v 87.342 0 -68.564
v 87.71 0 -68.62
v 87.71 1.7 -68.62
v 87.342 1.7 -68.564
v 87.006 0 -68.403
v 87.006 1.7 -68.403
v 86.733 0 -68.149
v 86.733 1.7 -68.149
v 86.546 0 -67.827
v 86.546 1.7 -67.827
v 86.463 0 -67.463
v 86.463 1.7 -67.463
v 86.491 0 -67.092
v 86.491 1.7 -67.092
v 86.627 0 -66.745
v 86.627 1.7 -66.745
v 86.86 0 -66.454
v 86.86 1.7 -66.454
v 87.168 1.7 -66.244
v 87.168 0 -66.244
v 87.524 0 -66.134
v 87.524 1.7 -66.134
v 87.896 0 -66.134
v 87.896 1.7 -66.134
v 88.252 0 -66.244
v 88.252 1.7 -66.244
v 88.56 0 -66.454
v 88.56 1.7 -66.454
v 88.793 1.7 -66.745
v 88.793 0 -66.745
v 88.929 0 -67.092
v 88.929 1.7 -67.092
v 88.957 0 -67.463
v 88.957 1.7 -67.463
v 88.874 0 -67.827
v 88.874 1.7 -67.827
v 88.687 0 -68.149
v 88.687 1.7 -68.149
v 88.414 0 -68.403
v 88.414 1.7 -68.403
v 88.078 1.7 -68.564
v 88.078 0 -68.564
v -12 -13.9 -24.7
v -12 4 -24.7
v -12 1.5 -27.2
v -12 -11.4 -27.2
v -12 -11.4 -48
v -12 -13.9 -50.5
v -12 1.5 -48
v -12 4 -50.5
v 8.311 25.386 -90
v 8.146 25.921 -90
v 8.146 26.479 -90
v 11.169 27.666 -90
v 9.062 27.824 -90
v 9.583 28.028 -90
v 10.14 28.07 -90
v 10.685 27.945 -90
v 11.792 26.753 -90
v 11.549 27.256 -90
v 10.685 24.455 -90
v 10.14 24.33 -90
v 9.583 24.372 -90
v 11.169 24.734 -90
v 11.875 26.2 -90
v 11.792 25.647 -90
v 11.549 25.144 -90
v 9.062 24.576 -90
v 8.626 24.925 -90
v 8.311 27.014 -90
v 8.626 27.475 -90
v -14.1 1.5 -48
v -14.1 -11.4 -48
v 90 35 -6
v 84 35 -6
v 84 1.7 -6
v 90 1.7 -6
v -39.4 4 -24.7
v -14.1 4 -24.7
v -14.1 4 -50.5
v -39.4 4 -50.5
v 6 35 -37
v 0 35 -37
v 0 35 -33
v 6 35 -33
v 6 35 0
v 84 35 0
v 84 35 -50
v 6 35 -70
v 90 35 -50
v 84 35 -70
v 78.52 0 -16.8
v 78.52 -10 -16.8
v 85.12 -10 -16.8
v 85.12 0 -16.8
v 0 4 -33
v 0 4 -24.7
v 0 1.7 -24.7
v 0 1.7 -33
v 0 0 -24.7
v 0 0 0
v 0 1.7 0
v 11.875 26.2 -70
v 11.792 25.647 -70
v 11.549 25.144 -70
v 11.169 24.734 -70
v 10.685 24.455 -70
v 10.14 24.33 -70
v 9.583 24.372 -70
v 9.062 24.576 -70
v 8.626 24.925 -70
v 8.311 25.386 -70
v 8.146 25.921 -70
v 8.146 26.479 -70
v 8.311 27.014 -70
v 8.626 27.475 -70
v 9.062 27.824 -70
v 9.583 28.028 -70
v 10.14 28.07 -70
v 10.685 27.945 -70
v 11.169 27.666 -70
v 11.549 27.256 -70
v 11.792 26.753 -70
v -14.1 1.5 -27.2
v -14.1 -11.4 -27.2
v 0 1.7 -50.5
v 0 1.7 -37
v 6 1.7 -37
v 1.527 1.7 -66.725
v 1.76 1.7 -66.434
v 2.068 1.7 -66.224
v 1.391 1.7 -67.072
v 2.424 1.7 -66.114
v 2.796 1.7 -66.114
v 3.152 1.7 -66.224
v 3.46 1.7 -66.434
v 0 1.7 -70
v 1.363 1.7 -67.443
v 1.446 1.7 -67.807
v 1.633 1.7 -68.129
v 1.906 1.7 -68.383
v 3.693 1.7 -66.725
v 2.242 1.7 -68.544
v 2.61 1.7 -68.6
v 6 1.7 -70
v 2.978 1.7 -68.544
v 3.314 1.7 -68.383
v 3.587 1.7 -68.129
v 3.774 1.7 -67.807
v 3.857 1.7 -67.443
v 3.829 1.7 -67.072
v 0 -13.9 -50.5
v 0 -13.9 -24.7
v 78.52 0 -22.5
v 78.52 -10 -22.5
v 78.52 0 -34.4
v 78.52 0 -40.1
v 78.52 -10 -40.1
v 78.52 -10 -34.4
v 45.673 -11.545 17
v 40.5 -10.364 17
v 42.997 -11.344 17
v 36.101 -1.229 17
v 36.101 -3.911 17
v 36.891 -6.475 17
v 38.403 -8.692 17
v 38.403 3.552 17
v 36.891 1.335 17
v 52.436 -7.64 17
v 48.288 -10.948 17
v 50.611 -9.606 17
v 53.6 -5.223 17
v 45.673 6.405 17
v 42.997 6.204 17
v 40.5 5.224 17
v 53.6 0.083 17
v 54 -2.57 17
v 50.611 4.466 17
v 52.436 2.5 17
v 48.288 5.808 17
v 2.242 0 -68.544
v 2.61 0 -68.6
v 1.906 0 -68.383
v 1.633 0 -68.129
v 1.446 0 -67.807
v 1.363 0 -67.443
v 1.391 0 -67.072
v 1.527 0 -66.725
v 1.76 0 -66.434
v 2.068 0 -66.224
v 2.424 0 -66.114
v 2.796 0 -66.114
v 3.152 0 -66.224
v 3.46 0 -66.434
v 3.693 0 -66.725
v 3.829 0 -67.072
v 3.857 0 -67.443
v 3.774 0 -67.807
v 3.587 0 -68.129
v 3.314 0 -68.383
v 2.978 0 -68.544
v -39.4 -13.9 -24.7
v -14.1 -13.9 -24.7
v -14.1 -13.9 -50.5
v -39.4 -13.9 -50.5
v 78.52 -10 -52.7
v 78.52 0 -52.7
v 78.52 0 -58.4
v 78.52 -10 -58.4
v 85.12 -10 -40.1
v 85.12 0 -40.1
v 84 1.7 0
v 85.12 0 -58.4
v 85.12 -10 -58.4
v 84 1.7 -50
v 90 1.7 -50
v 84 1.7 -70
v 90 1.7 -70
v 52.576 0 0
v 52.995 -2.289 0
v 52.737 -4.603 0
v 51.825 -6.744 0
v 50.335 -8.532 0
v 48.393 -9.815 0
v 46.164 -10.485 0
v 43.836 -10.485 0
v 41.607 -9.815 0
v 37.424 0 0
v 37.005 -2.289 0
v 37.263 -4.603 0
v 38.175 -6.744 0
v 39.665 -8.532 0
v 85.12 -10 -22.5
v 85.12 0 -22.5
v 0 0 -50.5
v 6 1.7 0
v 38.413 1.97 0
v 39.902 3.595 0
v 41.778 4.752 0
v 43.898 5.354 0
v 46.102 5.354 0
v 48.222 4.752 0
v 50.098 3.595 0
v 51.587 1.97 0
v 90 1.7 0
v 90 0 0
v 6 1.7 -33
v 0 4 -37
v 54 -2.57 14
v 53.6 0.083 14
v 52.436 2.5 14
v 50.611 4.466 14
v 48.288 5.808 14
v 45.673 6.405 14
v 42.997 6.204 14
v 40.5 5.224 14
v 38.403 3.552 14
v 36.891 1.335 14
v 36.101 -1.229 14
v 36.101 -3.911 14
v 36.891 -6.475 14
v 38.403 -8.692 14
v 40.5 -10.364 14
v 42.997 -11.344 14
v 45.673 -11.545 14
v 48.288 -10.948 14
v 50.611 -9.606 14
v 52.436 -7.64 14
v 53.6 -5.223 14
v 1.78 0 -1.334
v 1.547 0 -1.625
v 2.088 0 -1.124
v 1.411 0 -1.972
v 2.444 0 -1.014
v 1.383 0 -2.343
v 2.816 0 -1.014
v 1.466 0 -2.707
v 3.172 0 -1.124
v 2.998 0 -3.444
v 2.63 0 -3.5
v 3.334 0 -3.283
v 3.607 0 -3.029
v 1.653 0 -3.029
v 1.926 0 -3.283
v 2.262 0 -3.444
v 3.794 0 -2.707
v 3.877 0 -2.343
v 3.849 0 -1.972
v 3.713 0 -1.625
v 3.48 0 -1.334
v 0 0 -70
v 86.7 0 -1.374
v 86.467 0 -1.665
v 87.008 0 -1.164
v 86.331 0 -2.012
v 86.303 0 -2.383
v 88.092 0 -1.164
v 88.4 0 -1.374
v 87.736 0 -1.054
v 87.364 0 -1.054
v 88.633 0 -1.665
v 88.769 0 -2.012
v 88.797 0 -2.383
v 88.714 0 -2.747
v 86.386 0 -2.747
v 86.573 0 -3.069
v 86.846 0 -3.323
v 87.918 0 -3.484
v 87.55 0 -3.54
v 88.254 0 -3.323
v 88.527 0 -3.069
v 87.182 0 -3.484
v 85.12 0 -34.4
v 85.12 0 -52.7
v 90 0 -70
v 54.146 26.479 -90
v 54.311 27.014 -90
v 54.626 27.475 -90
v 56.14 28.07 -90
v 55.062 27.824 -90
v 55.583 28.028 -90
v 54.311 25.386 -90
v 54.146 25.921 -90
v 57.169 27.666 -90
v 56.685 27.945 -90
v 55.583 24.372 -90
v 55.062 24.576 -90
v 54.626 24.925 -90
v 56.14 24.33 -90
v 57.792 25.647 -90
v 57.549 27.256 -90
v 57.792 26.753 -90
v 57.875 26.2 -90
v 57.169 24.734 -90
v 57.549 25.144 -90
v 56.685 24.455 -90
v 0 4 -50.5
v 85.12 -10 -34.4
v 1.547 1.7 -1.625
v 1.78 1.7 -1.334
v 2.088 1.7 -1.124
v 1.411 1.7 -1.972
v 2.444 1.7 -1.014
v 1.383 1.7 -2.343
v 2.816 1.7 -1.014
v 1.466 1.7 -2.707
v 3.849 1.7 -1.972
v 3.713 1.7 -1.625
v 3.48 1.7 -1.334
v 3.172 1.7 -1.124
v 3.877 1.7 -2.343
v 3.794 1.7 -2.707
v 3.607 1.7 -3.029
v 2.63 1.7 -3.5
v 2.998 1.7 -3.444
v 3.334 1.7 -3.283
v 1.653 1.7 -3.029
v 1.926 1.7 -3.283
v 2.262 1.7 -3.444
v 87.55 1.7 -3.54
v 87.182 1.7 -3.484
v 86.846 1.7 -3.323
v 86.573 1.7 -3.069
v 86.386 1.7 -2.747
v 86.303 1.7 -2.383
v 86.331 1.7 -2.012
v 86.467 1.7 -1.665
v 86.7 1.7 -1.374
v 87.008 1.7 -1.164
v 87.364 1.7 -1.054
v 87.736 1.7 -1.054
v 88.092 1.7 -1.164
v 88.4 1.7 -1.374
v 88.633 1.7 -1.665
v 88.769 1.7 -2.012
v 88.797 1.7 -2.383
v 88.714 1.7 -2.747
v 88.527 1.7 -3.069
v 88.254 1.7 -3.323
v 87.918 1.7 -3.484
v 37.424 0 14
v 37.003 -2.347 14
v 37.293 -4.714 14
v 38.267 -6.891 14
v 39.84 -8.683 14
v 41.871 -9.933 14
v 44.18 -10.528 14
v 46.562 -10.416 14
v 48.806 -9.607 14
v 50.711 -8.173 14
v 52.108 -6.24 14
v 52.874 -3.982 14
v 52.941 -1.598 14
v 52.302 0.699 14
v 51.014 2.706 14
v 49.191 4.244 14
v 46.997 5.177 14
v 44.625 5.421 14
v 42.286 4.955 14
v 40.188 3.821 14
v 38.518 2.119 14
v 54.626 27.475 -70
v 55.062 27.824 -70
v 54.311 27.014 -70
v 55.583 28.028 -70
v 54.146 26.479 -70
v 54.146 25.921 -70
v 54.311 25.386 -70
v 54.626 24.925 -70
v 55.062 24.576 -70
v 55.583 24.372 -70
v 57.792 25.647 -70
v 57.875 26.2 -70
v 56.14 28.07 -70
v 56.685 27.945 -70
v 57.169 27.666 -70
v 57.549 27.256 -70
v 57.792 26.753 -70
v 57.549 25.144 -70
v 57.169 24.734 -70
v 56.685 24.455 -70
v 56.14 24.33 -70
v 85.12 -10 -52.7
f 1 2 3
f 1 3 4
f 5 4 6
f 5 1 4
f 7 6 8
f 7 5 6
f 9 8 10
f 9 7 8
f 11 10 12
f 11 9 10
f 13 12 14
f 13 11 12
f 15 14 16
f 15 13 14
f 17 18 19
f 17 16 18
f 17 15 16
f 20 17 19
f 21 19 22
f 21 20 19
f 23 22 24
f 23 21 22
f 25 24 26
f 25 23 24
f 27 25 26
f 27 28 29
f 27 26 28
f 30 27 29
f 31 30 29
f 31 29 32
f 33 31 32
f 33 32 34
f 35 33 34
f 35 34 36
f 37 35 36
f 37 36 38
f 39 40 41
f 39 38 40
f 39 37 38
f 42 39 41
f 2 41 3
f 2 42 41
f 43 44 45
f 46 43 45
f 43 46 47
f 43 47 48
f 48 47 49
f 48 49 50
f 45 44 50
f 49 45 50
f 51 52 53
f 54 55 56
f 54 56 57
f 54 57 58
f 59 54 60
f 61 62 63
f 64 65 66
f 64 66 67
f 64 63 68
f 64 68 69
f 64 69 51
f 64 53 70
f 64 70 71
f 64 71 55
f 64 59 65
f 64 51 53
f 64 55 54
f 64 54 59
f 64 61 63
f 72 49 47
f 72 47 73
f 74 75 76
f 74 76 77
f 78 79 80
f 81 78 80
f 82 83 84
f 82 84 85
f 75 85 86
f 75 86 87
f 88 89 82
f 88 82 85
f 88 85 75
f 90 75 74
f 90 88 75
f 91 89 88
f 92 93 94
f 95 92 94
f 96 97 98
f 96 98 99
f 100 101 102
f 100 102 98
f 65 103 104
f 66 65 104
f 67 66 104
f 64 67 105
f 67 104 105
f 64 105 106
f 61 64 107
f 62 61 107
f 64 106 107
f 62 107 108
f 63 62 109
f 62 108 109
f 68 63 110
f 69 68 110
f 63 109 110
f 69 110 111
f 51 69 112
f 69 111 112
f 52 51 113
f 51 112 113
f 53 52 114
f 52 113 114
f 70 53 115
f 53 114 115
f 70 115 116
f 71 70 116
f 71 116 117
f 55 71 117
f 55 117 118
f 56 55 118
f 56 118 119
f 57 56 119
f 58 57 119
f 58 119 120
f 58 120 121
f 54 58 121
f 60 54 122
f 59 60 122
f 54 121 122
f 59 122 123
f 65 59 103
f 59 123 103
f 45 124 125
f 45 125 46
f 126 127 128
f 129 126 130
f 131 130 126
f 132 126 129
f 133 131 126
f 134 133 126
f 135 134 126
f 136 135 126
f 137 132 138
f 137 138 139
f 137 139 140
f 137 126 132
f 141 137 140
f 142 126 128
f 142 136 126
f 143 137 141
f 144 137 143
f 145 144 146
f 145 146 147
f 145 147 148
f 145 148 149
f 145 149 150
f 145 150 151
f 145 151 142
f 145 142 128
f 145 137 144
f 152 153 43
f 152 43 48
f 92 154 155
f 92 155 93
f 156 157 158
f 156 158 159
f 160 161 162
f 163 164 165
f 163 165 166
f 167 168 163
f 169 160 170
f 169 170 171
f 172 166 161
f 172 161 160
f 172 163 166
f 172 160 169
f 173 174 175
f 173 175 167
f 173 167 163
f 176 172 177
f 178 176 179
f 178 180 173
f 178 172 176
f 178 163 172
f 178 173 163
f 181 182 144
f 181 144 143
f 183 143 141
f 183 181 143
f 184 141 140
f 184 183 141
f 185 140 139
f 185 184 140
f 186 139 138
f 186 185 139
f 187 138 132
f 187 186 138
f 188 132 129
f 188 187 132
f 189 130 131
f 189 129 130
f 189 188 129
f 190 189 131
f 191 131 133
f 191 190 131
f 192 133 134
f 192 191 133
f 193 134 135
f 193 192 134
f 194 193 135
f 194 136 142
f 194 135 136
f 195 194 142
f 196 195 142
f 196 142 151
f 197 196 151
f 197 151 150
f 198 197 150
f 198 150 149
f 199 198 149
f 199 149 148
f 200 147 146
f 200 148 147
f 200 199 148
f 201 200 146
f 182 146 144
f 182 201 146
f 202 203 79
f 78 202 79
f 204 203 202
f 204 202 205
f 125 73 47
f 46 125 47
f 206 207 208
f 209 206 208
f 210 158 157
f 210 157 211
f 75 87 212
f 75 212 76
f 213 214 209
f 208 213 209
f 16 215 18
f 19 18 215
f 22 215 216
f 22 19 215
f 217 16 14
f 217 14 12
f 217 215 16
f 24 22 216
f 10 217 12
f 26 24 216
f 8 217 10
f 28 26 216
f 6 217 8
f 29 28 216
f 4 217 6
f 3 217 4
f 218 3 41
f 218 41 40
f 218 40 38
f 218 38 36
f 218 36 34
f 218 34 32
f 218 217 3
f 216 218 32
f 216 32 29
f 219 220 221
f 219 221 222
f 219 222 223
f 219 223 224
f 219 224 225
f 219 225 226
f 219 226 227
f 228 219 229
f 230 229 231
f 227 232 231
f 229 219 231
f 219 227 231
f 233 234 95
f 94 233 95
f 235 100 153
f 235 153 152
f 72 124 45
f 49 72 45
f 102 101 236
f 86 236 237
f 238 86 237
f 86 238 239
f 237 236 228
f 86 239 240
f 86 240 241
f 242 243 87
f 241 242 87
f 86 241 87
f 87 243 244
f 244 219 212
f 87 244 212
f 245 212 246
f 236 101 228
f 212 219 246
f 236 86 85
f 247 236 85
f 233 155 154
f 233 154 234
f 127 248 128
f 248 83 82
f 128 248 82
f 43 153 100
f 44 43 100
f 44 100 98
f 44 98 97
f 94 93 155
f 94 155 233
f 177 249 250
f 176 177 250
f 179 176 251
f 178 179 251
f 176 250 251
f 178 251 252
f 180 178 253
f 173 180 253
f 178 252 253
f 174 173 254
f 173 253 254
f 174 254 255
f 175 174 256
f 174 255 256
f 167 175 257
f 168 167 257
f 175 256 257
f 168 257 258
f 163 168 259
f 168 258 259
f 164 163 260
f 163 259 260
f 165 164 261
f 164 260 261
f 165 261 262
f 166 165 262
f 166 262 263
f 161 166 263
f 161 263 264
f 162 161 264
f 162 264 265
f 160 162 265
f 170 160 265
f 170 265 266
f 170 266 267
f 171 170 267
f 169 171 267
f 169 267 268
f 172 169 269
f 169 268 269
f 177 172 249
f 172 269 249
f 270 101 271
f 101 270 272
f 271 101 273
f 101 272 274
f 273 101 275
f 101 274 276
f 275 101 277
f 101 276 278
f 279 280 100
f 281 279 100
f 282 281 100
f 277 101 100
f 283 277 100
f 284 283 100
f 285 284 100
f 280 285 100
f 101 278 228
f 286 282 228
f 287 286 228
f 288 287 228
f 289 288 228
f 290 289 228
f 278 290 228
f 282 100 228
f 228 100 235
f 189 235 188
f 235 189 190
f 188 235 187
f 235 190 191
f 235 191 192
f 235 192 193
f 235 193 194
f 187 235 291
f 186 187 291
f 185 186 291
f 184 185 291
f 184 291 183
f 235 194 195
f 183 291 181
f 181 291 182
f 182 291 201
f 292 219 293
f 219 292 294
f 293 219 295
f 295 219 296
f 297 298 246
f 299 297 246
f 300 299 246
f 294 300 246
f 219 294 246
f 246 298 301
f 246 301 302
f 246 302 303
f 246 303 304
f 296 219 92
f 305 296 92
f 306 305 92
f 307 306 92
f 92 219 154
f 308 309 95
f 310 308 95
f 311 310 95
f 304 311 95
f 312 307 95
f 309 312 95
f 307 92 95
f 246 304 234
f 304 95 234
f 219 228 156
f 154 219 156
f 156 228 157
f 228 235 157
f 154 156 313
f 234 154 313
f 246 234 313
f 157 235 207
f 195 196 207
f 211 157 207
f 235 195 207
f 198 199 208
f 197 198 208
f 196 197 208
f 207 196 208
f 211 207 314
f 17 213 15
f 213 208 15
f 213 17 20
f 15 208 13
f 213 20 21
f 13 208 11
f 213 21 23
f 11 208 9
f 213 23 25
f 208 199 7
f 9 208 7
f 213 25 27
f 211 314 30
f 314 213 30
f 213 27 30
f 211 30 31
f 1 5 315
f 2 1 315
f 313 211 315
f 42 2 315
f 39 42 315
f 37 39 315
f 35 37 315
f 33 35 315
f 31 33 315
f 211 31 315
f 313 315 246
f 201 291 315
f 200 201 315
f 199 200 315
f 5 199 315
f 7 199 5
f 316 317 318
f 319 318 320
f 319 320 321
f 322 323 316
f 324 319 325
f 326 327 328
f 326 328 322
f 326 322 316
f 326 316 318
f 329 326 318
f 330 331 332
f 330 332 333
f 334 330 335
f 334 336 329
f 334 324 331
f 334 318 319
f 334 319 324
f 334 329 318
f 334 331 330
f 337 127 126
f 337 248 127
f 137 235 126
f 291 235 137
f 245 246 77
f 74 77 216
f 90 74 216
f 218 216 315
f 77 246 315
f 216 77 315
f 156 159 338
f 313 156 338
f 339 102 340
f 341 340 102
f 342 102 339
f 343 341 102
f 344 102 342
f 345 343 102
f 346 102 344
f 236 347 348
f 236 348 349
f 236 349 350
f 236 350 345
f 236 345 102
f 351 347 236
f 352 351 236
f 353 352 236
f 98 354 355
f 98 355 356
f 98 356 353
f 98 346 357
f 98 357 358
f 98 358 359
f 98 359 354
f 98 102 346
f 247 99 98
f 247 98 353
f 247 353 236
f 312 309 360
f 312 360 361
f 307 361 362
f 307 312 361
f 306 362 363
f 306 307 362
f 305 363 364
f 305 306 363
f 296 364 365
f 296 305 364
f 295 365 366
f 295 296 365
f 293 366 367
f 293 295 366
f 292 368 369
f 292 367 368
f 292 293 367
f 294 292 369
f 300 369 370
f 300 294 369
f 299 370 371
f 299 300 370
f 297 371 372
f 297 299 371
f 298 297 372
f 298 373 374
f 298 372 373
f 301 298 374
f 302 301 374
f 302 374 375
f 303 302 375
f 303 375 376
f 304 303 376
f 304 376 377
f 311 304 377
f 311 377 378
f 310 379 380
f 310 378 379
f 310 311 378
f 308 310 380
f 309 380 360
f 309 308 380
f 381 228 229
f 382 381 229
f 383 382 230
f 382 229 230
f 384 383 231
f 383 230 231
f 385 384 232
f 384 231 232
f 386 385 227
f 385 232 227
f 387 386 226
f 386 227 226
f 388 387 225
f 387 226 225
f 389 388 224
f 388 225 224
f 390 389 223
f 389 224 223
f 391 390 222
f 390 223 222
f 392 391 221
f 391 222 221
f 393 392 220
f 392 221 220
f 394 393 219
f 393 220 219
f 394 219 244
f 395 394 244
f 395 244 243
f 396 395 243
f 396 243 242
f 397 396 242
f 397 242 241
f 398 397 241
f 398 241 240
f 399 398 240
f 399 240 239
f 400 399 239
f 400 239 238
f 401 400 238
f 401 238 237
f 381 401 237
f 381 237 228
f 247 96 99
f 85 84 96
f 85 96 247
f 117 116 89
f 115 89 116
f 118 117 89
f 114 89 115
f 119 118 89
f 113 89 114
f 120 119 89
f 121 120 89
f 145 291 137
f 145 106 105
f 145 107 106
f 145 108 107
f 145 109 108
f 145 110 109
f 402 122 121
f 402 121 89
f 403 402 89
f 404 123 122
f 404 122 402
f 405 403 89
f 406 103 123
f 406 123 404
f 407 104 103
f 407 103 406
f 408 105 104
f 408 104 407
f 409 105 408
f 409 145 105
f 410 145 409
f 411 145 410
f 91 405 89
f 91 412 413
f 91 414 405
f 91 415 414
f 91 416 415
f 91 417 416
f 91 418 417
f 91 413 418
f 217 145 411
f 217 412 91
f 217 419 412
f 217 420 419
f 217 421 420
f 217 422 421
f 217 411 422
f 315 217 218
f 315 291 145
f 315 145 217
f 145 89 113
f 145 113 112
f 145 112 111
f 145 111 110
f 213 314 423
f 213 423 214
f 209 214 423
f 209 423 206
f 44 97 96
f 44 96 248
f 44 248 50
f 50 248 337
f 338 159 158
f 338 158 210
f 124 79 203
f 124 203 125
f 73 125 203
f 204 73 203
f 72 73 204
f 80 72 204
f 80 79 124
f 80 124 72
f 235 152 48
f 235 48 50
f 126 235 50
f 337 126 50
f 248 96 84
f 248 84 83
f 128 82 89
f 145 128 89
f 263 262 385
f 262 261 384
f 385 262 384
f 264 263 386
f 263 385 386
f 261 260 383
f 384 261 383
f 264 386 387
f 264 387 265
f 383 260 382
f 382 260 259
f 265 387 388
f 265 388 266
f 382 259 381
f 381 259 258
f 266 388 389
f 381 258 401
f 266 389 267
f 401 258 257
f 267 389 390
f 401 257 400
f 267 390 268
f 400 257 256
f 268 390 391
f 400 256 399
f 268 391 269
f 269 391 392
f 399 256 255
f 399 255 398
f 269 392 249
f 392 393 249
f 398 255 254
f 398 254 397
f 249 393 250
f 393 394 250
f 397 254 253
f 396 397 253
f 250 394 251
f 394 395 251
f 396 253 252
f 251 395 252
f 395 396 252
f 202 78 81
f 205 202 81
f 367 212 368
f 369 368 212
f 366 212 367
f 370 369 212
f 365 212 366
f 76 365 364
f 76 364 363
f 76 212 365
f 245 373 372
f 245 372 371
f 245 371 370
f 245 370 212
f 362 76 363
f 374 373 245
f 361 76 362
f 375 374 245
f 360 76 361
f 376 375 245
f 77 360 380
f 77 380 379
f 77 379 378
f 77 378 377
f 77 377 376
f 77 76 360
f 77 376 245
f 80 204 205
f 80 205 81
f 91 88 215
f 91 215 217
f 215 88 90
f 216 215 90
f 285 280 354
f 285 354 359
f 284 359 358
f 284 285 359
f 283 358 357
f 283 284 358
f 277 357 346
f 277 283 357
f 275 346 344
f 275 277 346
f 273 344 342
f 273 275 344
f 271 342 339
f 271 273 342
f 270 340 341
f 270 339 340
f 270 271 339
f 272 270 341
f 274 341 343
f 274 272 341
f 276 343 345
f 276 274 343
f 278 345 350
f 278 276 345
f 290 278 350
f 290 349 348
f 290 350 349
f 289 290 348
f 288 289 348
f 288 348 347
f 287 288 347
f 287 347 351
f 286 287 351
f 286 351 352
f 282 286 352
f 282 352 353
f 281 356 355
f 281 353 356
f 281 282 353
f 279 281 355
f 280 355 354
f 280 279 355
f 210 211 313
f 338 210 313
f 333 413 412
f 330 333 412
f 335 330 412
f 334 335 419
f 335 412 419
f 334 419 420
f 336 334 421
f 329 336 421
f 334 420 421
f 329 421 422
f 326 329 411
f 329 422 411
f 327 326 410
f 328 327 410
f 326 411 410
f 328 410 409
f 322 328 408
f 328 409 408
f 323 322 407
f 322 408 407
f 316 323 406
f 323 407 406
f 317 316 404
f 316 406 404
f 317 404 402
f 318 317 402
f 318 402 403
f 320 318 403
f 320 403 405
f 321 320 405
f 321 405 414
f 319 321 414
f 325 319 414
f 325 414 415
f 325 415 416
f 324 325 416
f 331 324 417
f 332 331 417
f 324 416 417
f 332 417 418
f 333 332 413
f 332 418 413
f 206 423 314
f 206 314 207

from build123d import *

# Parameters (mm, degrees)
SKETCH2_W               = 90
SKETCH2_H               = 70
BOSS_EXTRUDE1_DEPTH     = 35
SKETCH4_R               = 8
BOSS_EXTRUDE2_DEPTH     = 14
SKETCH6_W               = 6.6
SKETCH6_H               = 5.7
BOSS_EXTRUDE3_DEPTH     = 10
SKETCH10_W              = 6.6
SKETCH10_H              = 5.7
BOSS_EXTRUDE4_DEPTH     = 10
SKETCH7_W               = 6.6
SKETCH7_H               = 5.7
BOSS_EXTRUDE5_DEPTH     = 10
CUT_EXTRUDE1_DEPTH      = 123.786908504
CUT_EXTRUDE1_DEPTH_BACK = 123.786908504
SKETCH11_R              = 1.25
CUT_EXTRUDE2_DEPTH      = 123.786908504
CUT_EXTRUDE2_DEPTH_BACK = 123.786908504
SKETCH15_R              = 1.25
CUT_EXTRUDE3_DEPTH      = 123.786908504
CUT_EXTRUDE3_DEPTH_BACK = 123.786908504
SKETCH14_R              = 1.25
CUT_EXTRUDE4_DEPTH      = 123.786908504
CUT_EXTRUDE4_DEPTH_BACK = 123.786908504
SKETCH12_R              = 1.25
SKETCH16_W              = 6
SKETCH16_H              = 33
CUT_EXTRUDE5_DEPTH      = 33.3
SKETCH19_W              = 6
SKETCH19_H              = 33
CUT_EXTRUDE6_DEPTH      = 33.3
SKETCH18_W              = 6
SKETCH18_H              = 6
CUT_EXTRUDE7_DEPTH      = 33.3
SKETCH17_W              = 6
SKETCH17_H              = 20
CUT_EXTRUDE8_DEPTH      = 33.3
SKETCH20_W              = 25.8
SKETCH20_H              = 17.9
BOSS_EXTRUDE6_DEPTH     = 39.4
SKETCH27_R              = 9
BOSS_EXTRUDE7_DEPTH     = 3
SKETCH29_W              = 2.1
SKETCH29_H              = 25.8
CUT_EXTRUDE14_DEPTH     = 2.5
SKETCH34_W              = 2.1
SKETCH34_H              = 15.4
CUT_EXTRUDE15_DEPTH     = 2.5
SKETCH35_W              = 2.1
SKETCH35_H              = 23.3
CUT_EXTRUDE16_DEPTH     = 2.5
SKETCH36_W              = 2.1
SKETCH36_H              = 12.9
CUT_EXTRUDE17_DEPTH     = 2.5
SKETCH38_R              = 1.875
BOSS_EXTRUDE8_DEPTH     = 20


with BuildPart() as part:
    # Sketch2 → Boss-Extrude1 (new body)
    with BuildSketch(Plane(origin=(0, 0, 0), x_dir=(1, 0, 0), z_dir=(0, 1, 0))):
        with Locations((45, 35)):
            Rectangle(SKETCH2_W, SKETCH2_H)
    extrude(amount=BOSS_EXTRUDE1_DEPTH)

    # Sketch4 → Boss-Extrude2 (add)
    with BuildSketch(Plane.XY):
        with Locations(Location((45, -2.57, 0), (0, 0, 161.261463564))):
            Circle(SKETCH4_R)
    extrude(amount=BOSS_EXTRUDE2_DEPTH)

    # Sketch6 → Boss-Extrude3 (add)
    with BuildSketch(Plane(origin=(0, 0, 0), x_dir=(-1, 0, 0), z_dir=(0, -1, 0))):
        with Locations((-81.82, 55.55)):
            Rectangle(SKETCH6_W, SKETCH6_H)
    extrude(amount=BOSS_EXTRUDE3_DEPTH)

    # Sketch10 → Boss-Extrude4 (add)
    with BuildSketch(Plane.XZ):
        with Locations((81.82, -37.25)):
            Rectangle(SKETCH10_W, SKETCH10_H)
    extrude(amount=BOSS_EXTRUDE4_DEPTH)

    # Sketch7 → Boss-Extrude5 (add)
    with BuildSketch(Plane.XZ):
        with Locations((81.82, -19.65)):
            Rectangle(SKETCH7_W, SKETCH7_H)
    extrude(amount=BOSS_EXTRUDE5_DEPTH)

    # Sketch11 → Cut-Extrude1 (cut, two sides: drawn at the far end of the back side and taken through both)
    with BuildSketch(Plane(origin=(0, 35, 0), x_dir=(1, 0, 0), z_dir=(0, 1, 0)).offset(-CUT_EXTRUDE1_DEPTH_BACK)):
        with Locations(Location((87.55, 2.29, 0), (0, 0, 90))):
            Circle(SKETCH11_R)
    extrude(amount=CUT_EXTRUDE1_DEPTH + CUT_EXTRUDE1_DEPTH_BACK, mode=Mode.SUBTRACT)

    # Sketch15 → Cut-Extrude2 (cut, two sides: drawn at the far end of the back side and taken through both)
    with BuildSketch(Plane(origin=(0, 35, 0), x_dir=(1, 0, 0), z_dir=(0, 1, 0)).offset(-CUT_EXTRUDE2_DEPTH_BACK)):
        with Locations(Location((2.61, 67.35, 0), (0, 0, 90))):
            Circle(SKETCH15_R)
    extrude(amount=CUT_EXTRUDE2_DEPTH + CUT_EXTRUDE2_DEPTH_BACK, mode=Mode.SUBTRACT)

    # Sketch14 → Cut-Extrude3 (cut, two sides: drawn at the far end of the back side and taken through both)
    with BuildSketch(Plane(origin=(0, 35, 0), x_dir=(1, 0, 0), z_dir=(0, 1, 0)).offset(-CUT_EXTRUDE3_DEPTH_BACK)):
        with Locations(Location((2.63, 2.25, 0), (0, 0, 90))):
            Circle(SKETCH14_R)
    extrude(amount=CUT_EXTRUDE3_DEPTH + CUT_EXTRUDE3_DEPTH_BACK, mode=Mode.SUBTRACT)

    # Sketch12 → Cut-Extrude4 (cut, two sides: drawn at the far end of the back side and taken through both)
    with BuildSketch(Plane(origin=(0, 35, 0), x_dir=(1, 0, 0), z_dir=(0, 1, 0)).offset(-CUT_EXTRUDE4_DEPTH_BACK)):
        with Locations(Location((87.71, 67.37, 0), (0, 0, 90))):
            Circle(SKETCH12_R)
    extrude(amount=CUT_EXTRUDE4_DEPTH + CUT_EXTRUDE4_DEPTH_BACK, mode=Mode.SUBTRACT)

    # Sketch16 → Cut-Extrude5 (cut)
    with BuildSketch(Plane(origin=(0, 35, 0), x_dir=(1, 0, 0), z_dir=(0, 1, 0))):
        with Locations((3, 53.5)):
            Rectangle(SKETCH16_W, SKETCH16_H)
    extrude(amount=-CUT_EXTRUDE5_DEPTH, mode=Mode.SUBTRACT)

    # Sketch19 → Cut-Extrude6 (cut)
    with BuildSketch(Plane(origin=(0, 35, 0), x_dir=(1, 0, 0), z_dir=(0, 1, 0))):
        with Locations((3, 16.5)):
            Rectangle(SKETCH19_W, SKETCH19_H)
    extrude(amount=-CUT_EXTRUDE6_DEPTH, mode=Mode.SUBTRACT)

    # Sketch18 → Cut-Extrude7 (cut)
    with BuildSketch(Plane(origin=(0, 35, 0), x_dir=(1, 0, 0), z_dir=(0, 1, 0))):
        with Locations((87, 3)):
            Rectangle(SKETCH18_W, SKETCH18_H)
    extrude(amount=-CUT_EXTRUDE7_DEPTH, mode=Mode.SUBTRACT)

    # Sketch17 → Cut-Extrude8 (cut)
    with BuildSketch(Plane(origin=(0, 35, 0), x_dir=(1, 0, 0), z_dir=(0, 1, 0))):
        with Locations((87, 60)):
            Rectangle(SKETCH17_W, SKETCH17_H)
    extrude(amount=-CUT_EXTRUDE8_DEPTH, mode=Mode.SUBTRACT)

    # Sketch20 → Boss-Extrude6 (add)
    with BuildSketch(Plane(origin=(0, 0, 0), x_dir=(0, 0, -1), z_dir=(1, 0, 0))):
        with Locations((37.6, -4.95)):
            Rectangle(SKETCH20_W, SKETCH20_H)
    extrude(amount=-BOSS_EXTRUDE6_DEPTH)

    # Sketch27 → Boss-Extrude7 (add)
    with BuildSketch(Plane.XY.offset(14)):
        with Locations((45, -2.57)):
            Circle(SKETCH27_R)
    extrude(amount=BOSS_EXTRUDE7_DEPTH)

    # Sketch29 → Cut-Extrude14 (cut)
    with BuildSketch(Plane(origin=(0, 4, 0), x_dir=(1, 0, 0), z_dir=(0, 1, 0))):
        with Locations((-13.05, 37.6)):
            Rectangle(SKETCH29_W, SKETCH29_H)
    extrude(amount=-CUT_EXTRUDE14_DEPTH, mode=Mode.SUBTRACT)

    # Sketch34 → Cut-Extrude15 (cut)
    with BuildSketch(Plane.XY.offset(-24.7)):
        with Locations((-13.05, -6.2)):
            Rectangle(SKETCH34_W, SKETCH34_H)
    extrude(amount=-CUT_EXTRUDE15_DEPTH, mode=Mode.SUBTRACT)

    # Sketch35 → Cut-Extrude16 (cut)
    with BuildSketch(Plane.XZ.offset(13.9)):
        with Locations((-13.05, -38.85)):
            Rectangle(SKETCH35_W, SKETCH35_H)
    extrude(amount=-CUT_EXTRUDE16_DEPTH, mode=Mode.SUBTRACT)

    # Sketch36 → Cut-Extrude17 (cut)
    with BuildSketch(Plane(origin=(0, 0, -50.5), x_dir=(-1, 0, 0), z_dir=(0, 0, -1))):
        with Locations((13.05, -4.95)):
            Rectangle(SKETCH36_W, SKETCH36_H)
    extrude(amount=-CUT_EXTRUDE17_DEPTH, mode=Mode.SUBTRACT)

    # Sketch38 → Boss-Extrude8 (add)
    with BuildSketch(Plane(origin=(0, 0, -70), x_dir=(-1, 0, 0), z_dir=(0, 0, -1))):
        with Locations(Location((-56, 26.2, 0), (0, 0, 180))):
            Circle(SKETCH38_R)
        with Locations(Location((-10, 26.2, 0), (0, 0, 180))):
            Circle(SKETCH38_R)
    extrude(amount=BOSS_EXTRUDE8_DEPTH)


solid = part.part
